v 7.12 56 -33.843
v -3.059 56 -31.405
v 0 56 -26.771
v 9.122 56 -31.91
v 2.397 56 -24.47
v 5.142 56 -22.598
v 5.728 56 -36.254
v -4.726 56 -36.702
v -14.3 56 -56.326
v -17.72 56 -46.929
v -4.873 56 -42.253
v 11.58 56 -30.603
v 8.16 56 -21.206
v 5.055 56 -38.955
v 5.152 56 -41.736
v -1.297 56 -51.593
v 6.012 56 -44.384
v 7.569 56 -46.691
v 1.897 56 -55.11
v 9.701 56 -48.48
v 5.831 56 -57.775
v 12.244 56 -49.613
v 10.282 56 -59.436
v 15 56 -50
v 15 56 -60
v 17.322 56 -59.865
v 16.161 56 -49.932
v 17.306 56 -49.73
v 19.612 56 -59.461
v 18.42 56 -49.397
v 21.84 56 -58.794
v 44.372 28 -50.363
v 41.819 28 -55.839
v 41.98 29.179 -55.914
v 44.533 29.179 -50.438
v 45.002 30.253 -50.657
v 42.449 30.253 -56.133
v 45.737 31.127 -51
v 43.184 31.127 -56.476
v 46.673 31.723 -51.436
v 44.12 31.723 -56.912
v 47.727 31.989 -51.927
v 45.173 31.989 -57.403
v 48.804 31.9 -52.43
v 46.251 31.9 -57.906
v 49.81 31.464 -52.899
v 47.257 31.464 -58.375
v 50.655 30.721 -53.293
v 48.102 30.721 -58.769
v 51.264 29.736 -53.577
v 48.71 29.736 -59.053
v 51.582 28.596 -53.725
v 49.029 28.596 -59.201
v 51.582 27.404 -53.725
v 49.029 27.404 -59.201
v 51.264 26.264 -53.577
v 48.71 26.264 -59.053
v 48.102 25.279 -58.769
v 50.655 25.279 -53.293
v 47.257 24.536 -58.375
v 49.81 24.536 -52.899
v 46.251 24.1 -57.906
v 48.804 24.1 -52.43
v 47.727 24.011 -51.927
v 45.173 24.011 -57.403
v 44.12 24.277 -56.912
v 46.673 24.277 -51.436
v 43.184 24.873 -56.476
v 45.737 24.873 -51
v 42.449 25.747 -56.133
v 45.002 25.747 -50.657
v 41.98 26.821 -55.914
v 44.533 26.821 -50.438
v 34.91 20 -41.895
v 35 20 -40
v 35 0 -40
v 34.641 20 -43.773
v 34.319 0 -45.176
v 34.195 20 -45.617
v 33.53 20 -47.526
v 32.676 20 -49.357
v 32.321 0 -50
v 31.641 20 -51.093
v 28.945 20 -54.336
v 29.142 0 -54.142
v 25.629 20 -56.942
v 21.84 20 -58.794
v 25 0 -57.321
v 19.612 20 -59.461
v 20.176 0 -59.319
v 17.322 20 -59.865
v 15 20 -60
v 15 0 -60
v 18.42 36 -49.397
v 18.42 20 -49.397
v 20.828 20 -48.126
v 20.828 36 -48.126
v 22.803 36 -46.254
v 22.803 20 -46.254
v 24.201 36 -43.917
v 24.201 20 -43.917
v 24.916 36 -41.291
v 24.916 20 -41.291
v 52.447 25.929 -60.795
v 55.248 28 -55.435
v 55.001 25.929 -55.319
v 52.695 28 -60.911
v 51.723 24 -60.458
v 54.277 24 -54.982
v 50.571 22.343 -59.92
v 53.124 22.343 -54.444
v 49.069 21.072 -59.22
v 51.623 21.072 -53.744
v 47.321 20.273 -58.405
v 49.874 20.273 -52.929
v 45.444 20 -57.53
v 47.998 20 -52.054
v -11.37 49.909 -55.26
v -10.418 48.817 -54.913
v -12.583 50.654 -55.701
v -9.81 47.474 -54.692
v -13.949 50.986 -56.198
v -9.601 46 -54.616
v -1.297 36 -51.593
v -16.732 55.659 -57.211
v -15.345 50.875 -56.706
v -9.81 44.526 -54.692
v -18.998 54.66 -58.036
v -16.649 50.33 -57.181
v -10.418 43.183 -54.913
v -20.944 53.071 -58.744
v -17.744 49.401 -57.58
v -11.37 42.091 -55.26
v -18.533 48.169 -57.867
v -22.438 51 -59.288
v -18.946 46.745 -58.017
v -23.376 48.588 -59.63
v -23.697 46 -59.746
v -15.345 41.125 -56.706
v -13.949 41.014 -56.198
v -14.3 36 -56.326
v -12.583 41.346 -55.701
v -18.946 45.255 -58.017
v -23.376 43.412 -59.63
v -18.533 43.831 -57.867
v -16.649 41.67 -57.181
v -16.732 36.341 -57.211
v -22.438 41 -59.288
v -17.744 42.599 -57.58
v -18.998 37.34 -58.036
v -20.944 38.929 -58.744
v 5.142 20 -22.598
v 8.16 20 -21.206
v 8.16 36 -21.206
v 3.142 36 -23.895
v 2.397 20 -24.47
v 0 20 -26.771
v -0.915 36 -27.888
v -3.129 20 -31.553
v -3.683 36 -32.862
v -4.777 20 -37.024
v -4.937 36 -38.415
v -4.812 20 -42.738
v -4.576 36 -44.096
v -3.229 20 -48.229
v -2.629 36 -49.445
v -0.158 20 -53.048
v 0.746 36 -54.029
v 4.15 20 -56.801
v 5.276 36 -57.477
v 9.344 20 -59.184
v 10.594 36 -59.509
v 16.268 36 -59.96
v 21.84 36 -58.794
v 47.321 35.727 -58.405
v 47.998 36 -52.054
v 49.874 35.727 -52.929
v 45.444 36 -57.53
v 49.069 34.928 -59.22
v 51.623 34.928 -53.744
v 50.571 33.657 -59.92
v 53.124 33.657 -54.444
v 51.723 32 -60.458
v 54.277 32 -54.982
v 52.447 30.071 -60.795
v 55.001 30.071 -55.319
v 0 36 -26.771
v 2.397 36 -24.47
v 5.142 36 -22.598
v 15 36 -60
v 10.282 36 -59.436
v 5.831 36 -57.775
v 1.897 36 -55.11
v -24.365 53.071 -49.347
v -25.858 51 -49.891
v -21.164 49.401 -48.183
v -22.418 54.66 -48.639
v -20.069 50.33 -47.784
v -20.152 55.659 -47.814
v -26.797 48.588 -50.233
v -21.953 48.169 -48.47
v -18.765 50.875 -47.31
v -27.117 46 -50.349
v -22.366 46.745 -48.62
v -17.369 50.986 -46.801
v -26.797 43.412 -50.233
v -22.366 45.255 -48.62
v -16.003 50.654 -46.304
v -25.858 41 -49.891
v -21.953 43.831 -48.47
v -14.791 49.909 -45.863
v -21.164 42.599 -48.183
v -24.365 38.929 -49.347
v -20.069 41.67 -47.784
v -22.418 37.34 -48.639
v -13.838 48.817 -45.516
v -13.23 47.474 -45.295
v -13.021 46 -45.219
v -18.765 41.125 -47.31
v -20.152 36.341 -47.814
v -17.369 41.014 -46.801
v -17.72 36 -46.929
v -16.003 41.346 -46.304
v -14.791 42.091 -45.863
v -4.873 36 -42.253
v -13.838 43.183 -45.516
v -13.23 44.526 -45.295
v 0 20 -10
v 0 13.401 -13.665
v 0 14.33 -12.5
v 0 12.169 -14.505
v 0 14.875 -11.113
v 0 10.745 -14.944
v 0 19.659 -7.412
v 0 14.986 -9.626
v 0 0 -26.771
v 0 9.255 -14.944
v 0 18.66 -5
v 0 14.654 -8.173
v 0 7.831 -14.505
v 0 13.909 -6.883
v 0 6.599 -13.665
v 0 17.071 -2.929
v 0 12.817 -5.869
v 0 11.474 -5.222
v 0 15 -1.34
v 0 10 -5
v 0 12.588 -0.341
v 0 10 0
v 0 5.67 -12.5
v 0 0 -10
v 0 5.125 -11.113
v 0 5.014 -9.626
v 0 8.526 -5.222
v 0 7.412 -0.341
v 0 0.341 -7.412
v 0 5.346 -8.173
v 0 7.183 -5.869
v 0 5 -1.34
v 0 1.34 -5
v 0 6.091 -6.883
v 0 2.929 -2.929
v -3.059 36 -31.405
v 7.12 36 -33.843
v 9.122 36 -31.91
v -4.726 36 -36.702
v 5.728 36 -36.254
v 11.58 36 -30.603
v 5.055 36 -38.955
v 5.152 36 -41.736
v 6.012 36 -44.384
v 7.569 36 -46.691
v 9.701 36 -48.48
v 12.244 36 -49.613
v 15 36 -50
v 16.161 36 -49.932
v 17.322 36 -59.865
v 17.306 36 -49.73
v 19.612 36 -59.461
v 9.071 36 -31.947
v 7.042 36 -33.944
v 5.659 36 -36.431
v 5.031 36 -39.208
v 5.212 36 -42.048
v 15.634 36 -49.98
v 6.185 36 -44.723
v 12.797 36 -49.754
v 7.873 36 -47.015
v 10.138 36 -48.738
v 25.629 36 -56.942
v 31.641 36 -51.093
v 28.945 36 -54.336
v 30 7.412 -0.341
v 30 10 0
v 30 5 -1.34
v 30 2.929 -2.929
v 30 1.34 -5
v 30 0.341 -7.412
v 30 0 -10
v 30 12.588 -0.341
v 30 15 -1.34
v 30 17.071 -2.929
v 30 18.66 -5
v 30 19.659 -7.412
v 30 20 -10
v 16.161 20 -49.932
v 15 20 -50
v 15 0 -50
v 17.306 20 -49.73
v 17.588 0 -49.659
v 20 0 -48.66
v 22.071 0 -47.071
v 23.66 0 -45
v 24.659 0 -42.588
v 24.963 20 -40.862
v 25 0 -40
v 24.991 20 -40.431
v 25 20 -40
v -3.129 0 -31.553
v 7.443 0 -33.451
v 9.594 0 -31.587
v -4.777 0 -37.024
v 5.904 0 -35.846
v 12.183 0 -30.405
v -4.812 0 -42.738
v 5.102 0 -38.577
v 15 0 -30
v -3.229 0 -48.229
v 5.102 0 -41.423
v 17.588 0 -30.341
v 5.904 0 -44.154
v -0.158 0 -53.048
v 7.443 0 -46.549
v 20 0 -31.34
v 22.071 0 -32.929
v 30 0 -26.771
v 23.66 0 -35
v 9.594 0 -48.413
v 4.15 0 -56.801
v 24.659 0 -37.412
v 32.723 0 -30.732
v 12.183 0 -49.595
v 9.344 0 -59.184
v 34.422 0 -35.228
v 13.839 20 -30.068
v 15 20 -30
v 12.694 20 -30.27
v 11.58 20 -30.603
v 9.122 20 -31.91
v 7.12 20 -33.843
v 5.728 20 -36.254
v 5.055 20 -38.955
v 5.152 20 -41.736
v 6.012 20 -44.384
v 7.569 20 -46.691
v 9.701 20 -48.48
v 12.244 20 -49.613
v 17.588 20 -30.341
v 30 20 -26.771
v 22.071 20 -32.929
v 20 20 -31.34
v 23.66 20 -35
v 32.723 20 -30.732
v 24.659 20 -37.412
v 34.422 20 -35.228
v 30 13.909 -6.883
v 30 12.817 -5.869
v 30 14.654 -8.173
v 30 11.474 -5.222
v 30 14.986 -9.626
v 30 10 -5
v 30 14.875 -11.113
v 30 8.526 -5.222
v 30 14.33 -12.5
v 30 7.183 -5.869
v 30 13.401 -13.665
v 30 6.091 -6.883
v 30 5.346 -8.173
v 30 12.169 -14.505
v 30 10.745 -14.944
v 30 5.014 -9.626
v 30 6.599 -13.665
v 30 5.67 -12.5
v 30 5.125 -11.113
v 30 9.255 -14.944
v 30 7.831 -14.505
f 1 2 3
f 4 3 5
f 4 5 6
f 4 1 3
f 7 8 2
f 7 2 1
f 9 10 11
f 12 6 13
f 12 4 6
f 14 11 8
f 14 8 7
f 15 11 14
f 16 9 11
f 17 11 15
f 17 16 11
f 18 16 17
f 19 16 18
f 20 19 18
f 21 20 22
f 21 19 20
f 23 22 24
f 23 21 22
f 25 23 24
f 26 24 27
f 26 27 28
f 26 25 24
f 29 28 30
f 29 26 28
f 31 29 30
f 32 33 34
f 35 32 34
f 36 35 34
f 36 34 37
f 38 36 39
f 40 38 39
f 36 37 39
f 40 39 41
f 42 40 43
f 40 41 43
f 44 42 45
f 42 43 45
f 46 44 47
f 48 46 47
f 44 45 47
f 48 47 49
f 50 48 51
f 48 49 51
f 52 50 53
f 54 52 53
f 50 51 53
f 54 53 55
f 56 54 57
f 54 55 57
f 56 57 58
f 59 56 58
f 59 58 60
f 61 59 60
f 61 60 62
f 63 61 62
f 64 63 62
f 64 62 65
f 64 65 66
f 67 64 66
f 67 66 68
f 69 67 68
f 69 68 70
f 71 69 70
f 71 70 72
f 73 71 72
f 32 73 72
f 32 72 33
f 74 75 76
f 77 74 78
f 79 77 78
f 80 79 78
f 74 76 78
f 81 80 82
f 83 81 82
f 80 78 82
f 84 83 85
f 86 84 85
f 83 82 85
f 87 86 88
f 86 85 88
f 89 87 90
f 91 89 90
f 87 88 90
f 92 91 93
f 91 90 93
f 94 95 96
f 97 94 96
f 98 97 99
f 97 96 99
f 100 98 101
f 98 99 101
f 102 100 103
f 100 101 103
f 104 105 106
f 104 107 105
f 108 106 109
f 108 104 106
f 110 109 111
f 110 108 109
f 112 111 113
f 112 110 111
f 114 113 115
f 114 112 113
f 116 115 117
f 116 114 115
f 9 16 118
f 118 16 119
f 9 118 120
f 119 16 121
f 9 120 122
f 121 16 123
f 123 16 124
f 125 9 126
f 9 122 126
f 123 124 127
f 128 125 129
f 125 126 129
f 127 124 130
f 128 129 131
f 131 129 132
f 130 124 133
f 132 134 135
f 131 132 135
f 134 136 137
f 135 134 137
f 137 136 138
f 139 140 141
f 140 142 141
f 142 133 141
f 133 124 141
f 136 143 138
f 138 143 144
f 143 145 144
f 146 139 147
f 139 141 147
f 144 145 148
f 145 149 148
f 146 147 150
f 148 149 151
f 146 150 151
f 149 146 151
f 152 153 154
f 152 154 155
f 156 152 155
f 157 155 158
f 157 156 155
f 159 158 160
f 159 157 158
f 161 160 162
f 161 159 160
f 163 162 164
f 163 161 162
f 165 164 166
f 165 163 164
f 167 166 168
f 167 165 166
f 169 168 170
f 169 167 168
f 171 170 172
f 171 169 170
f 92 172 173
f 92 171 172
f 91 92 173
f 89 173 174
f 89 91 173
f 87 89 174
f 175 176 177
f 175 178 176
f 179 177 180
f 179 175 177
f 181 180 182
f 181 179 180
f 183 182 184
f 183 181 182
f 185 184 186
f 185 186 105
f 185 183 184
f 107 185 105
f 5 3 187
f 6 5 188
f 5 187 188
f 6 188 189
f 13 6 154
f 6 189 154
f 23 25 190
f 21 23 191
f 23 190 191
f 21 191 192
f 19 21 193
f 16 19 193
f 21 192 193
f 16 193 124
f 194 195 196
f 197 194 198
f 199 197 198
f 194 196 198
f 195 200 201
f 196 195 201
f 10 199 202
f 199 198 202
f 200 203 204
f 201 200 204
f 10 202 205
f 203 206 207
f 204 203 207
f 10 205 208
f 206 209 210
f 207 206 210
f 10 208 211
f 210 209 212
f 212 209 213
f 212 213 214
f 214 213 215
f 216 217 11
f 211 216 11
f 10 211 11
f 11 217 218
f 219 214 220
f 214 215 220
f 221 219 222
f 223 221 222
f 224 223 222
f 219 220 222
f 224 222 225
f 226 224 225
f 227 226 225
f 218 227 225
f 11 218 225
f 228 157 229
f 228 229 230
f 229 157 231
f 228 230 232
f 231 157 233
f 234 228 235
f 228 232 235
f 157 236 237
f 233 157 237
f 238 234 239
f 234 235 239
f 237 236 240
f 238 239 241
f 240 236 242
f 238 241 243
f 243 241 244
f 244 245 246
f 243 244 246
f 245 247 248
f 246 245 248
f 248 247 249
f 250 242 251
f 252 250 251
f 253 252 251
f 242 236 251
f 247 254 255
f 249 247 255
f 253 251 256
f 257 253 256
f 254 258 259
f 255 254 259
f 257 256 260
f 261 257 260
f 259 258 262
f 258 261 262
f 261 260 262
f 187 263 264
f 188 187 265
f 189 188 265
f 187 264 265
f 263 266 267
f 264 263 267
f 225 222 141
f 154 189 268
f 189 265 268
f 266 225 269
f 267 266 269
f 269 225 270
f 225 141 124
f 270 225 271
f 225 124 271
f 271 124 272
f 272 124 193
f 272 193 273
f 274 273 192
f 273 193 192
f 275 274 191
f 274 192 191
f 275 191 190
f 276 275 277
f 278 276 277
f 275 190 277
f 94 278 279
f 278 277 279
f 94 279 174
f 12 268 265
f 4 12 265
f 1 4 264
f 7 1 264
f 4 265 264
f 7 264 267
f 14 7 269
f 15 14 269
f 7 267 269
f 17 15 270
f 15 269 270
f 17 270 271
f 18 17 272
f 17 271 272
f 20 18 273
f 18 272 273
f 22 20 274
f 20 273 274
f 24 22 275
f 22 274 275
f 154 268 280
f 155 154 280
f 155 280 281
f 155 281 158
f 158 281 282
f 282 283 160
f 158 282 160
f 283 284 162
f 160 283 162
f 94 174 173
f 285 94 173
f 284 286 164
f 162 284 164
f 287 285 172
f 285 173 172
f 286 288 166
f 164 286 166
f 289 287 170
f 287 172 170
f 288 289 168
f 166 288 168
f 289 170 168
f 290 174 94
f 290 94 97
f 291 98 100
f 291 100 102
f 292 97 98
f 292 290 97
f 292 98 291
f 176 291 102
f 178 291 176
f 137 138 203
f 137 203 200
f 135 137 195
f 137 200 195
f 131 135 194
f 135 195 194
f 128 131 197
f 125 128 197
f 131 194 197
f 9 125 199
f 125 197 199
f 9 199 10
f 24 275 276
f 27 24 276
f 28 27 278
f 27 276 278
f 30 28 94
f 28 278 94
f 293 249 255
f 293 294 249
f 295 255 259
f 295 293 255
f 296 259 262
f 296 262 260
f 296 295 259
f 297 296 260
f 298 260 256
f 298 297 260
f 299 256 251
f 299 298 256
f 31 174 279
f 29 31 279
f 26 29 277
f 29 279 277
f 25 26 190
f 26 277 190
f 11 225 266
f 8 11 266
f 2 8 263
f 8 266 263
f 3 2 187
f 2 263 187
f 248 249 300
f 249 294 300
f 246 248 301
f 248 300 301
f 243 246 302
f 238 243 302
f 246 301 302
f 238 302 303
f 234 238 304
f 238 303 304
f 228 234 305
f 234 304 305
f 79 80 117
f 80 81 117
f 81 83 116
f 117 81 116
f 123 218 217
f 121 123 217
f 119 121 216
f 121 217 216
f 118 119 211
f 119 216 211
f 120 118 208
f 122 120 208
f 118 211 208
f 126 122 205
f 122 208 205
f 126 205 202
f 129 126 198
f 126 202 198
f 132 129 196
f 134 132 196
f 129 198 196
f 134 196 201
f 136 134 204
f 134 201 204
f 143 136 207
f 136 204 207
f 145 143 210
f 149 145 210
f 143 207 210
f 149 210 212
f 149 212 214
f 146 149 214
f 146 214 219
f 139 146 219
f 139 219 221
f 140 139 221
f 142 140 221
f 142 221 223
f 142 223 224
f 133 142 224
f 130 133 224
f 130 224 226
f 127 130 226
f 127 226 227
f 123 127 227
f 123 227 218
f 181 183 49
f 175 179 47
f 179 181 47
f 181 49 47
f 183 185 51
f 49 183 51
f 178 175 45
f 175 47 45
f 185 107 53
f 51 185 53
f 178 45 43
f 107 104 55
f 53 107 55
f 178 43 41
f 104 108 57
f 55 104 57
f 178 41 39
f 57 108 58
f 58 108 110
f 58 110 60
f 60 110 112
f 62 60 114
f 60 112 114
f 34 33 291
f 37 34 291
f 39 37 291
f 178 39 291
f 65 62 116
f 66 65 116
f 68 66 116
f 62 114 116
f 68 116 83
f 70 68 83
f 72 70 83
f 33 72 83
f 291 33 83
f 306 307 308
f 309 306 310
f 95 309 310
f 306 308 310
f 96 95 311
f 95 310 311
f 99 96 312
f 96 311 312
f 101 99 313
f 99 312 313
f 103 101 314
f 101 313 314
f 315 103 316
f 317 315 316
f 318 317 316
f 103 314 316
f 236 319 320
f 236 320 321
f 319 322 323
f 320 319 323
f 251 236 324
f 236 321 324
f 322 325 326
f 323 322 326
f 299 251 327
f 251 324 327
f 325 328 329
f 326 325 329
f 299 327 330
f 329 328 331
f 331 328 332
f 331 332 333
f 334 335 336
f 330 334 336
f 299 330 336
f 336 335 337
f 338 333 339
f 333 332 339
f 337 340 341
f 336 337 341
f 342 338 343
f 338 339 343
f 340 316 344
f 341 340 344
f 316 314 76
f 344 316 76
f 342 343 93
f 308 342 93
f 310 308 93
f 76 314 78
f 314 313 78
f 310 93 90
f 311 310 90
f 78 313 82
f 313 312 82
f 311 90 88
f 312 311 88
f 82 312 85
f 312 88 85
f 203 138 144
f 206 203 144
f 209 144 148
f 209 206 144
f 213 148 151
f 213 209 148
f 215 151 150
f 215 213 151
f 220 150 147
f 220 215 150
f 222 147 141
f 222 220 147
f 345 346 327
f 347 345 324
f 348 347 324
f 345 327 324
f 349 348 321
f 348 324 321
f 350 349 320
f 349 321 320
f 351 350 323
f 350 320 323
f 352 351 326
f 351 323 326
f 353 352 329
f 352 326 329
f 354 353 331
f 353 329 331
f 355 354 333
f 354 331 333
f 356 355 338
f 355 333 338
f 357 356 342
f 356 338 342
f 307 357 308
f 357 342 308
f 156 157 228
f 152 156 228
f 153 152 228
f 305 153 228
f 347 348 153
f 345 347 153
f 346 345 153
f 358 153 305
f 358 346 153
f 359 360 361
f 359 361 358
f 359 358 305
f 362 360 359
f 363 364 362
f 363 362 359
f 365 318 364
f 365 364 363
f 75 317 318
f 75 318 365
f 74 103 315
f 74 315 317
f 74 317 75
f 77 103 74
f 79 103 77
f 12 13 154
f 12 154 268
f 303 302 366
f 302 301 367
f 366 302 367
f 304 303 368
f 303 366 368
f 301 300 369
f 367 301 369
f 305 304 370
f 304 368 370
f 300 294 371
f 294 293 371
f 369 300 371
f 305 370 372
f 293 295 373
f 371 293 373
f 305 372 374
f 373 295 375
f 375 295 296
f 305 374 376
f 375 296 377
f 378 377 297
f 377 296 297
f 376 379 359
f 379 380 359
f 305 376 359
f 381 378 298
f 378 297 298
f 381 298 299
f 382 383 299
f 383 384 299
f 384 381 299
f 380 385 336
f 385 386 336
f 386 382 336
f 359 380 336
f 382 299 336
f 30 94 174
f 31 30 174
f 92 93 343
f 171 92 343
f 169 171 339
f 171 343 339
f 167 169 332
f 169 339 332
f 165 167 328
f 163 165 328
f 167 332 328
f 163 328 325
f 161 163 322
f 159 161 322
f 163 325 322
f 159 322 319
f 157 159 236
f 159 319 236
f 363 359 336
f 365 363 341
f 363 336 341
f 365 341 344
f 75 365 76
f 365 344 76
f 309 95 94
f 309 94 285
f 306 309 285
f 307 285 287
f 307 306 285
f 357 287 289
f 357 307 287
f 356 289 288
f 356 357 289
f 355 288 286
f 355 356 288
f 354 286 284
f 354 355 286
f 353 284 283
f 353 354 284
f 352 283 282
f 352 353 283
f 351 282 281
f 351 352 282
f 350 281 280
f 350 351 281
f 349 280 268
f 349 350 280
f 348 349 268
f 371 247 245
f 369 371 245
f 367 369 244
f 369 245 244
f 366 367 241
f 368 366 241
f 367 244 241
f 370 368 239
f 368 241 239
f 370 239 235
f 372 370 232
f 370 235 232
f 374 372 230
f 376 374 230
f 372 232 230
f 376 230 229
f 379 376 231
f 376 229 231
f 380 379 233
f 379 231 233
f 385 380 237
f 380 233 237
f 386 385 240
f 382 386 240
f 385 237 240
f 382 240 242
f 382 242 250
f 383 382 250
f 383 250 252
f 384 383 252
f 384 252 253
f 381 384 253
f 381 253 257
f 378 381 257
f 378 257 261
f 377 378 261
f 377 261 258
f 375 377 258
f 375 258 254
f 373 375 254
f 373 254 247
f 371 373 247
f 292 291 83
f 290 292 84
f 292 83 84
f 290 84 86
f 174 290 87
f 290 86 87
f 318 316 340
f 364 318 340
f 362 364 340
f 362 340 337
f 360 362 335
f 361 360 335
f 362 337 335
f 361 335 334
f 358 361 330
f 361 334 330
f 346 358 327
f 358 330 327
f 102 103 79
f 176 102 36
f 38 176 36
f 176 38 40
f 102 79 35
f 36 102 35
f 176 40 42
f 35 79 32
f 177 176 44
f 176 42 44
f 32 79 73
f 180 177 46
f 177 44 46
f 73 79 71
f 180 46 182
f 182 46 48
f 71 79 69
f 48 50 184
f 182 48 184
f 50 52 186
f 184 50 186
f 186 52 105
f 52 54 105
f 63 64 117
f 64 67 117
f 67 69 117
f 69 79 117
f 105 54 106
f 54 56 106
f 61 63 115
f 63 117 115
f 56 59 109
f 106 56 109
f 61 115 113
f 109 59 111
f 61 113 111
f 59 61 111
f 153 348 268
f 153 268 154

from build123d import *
from build123d.topology import SkipClean

# Parameters (mm, degrees)
EXTRUDE_4_DEPTH     = 20
FILLET_2_R          = 10
SKETCH_5_R          = 5
CUT_EXTRUDE_1_DEPTH = 73.284161474
EXTRUDE_START       = 16
EXTRUDE_6_DEPTH     = 20
FILLET_3_R          = 10
SKETCH_9_R          = 5
CUT_EXTRUDE_2_DEPTH = 78.613189577
EXTRUDE_7_DEPTH     = 16
FILLET_4_R          = 8
SKETCH_13_R         = 4
CUT_EXTRUDE_3_DEPTH = 95.259541887
EXTRUDE_8_DEPTH     = 16


with BuildPart() as part:
    # 草图1 → 凸台-拉伸4 (new body)
    with BuildSketch(Plane(origin=(0, 0, 0), x_dir=(1, 0, 0), z_dir=(0, 1, 0))):
        with BuildLine():
            ThreePointArc((15, 60), (-3.228756555, 48.228756555), (0, 26.771243445))
            ThreePointArc((0, 26.771243445), (6.771243445, 21.771243445), (15, 20))
            Line((15, 20), (15, 30))
            ThreePointArc((15, 30), (5, 40), (15, 50))
            Line((15, 50), (15, 60))
        make_face()
        with BuildLine():
            ThreePointArc((35, 40), (29.142135624, 54.142135624), (15, 60))
            Line((15, 60), (15, 50))
            ThreePointArc((15, 50), (22.071067812, 47.071067812), (25, 40))
            ThreePointArc((25, 40), (22.071067812, 32.928932188), (15, 30))
            Line((15, 30), (15, 20))
            ThreePointArc((15, 20), (23.228756555, 21.771243445), (30, 26.771243445))
            ThreePointArc((30, 26.771243445), (33.708286934, 32.928932188), (35, 40))
        make_face()
        with BuildLine():
            ThreePointArc((15, 60), (-3.228756555, 48.228756555), (0, 26.771243445))
            ThreePointArc((0, 26.771243445), (6.771243445, 21.771243445), (15, 20))
            Line((15, 20), (15, 30))
            ThreePointArc((15, 30), (5, 40), (15, 50))
            Line((15, 50), (15, 60))
        make_face()
        with BuildLine():
            ThreePointArc((35, 40), (29.142135624, 54.142135624), (15, 60))
            Line((15, 60), (15, 50))
            ThreePointArc((15, 50), (22.071067812, 47.071067812), (25, 40))
            ThreePointArc((25, 40), (22.071067812, 32.928932188), (15, 30))
            Line((15, 30), (15, 20))
            ThreePointArc((15, 20), (23.228756555, 21.771243445), (30, 26.771243445))
            ThreePointArc((30, 26.771243445), (33.708286934, 32.928932188), (35, 40))
        make_face()
        with BuildLine():
            Line((0, 26.771243445), (0, 0))
            Line((0, 0), (15, 0))
            Line((15, 0), (15, 20))
            ThreePointArc((15, 20), (6.771243445, 21.771243445), (0, 26.771243445))
        make_face()
        with BuildLine():
            Line((15, 20), (15, 0))
            Line((15, 0), (30, 0))
            Line((30, 0), (30, 26.771243445))
            ThreePointArc((30, 26.771243445), (23.228756555, 21.771243445), (15, 20))
        make_face()
    extrude(amount=EXTRUDE_4_DEPTH)

    # 圆角2
    fillet_2_edges = [part.edges().sort_by_distance(p)[0] for p in [
        (15, 0, 0),
        (15, 20, 0),
    ]]
    fillet(fillet_2_edges, radius=FILLET_2_R - 0.0001)  # a hair under: the kernel refuses the full size

    # 草图5 → 切除-拉伸1 (cut, through all)
    with BuildSketch(Plane.ZY):
        with Locations((-10, 10)):
            Circle(SKETCH_5_R)
    extrude(amount=-CUT_EXTRUDE_1_DEPTH, mode=Mode.SUBTRACT)

    # 草图11 → 凸台-拉伸7 (add)
    with BuildSketch(Plane(origin=(0, 20, 0), x_dir=(1, 0, 0), z_dir=(0, 1, 0))):
        with BuildLine():
            Line((21.840402867, 58.793852416), (18.420201433, 49.396926208))
            ThreePointArc((18.420201433, 49.396926208), (22.803417949, 46.253532466), (24.916346187, 41.290766554))
            Line((24.916346187, 41.290766554), (55.247963432, 55.434631959))
            Line((55.247963432, 55.434631959), (52.694506253, 60.910538551))
            Line((52.694506253, 60.910538551), (31.641450271, 51.093337319))
            ThreePointArc((31.641450271, 51.093337319), (27.356125602, 55.726606758), (21.840402867, 58.793852416))
        make_face()
    extrude(amount=EXTRUDE_7_DEPTH)

    # 圆角4
    fillet_4_edges = [part.edges().sort_by_distance(p)[0] for p in [
        (53.971234843, 20, -58.172585255),
        (53.971234843, 36, -58.172585255),
    ]]
    fillet(fillet_4_edges, radius=FILLET_4_R - 0.0001)  # a hair under: the kernel refuses the full size

    # 草图13 → 切除-拉伸3 (cut, through all)
    with BuildSketch(Plane(origin=(-13.918524524, 0, -29.848372166), x_dir=(-0.9063077870366495, 0, 0.42261826174070066), z_dir=(-0.42261826174070066, 0, -0.9063077870366495))):
        with Locations((-65.499347275, 28)):
            Circle(SKETCH_13_R)
    extrude(amount=-CUT_EXTRUDE_3_DEPTH, mode=Mode.SUBTRACT)

    # 草图15 → 凸台-拉伸8 (add)
    with SkipClean():  # the faces are left unmerged after this step: merging them gives an invalid solid
        with BuildSketch(Plane(origin=(0, 20, 0), x_dir=(1, 0, 0), z_dir=(0, 1, 0))):
            with BuildLine():
                Line((11.579798567, 30.603073792), (8.159597133, 21.206147584))
                ThreePointArc((8.159597133, 21.206147584), (-3.793852416, 46.840402867), (21.840402867, 58.793852416))
                Line((21.840402867, 58.793852416), (18.420201433, 49.396926208))
                ThreePointArc((18.420201433, 49.396926208), (5.603073792, 43.420201433), (11.579798567, 30.603073792))
            make_face()
        extrude(amount=EXTRUDE_8_DEPTH)


with BuildPart() as body_2:
    # 草图7 → 凸台-拉伸6 (new body)
    with BuildSketch(Plane(origin=(0, 20, 0), x_dir=(1, 0, 0), z_dir=(0, 1, 0)).offset(EXTRUDE_START)):
        with BuildLine():
            Line((18.420201433, 49.396926208), (21.840402867, 58.793852416))
            ThreePointArc((21.840402867, 58.793852416), (18.472963553, 59.69615506), (15, 60))
            Line((15, 60), (15, 50))
            ThreePointArc((15, 50), (16.736481777, 49.84807753), (18.420201433, 49.396926208))
        make_face()
        with BuildLine():
            Line((15, 50), (15, 60))
            ThreePointArc((15, 60), (5.831214309, 57.774514591), (-1.297071505, 51.593336895))
            ThreePointArc((-1.297071505, 51.593336895), (-3.678158381, 47.150272687), (-4.872696835, 42.25298036))
            ThreePointArc((-4.872696835, 42.25298036), (-4.077402617, 33.995609158), (0, 26.771243445))
            ThreePointArc((0, 26.771243445), (3.73086639, 23.477087797), (8.159597133, 21.206147584))
            Line((8.159597133, 21.206147584), (11.579798567, 30.603073792))
            ThreePointArc((11.579798567, 30.603073792), (5.15192247, 41.736481777), (15, 50))
        make_face()
        with BuildLine():
            ThreePointArc((-4.872696835, 42.25298036), (-3.678158381, 47.150272687), (-1.297071505, 51.593336895))
            Line((-1.297071505, 51.593336895), (-23.696681977, 59.746128366))
            Line((-23.696681977, 59.746128366), (-27.11688341, 50.349202158))
            Line((-27.11688341, 50.349202158), (-4.872696835, 42.25298036))
        make_face()
    extrude(amount=EXTRUDE_6_DEPTH)

    # 圆角3
    fillet_3_edges = [body_2.edges().sort_by_distance(p)[0] for p in [
        (-25.406782694, 36, -55.047665262),
        (-25.406782694, 56, -55.047665262),
    ]]
    fillet(fillet_3_edges, radius=FILLET_3_R - 0.0001)  # a hair under: the kernel refuses the full size

    # 草图9 → 切除-拉伸2 (cut, through all)
    with BuildSketch(Plane(origin=(13.009848873, 0, -35.744266009), x_dir=(0.9396926207859082, 0, 0.34202014332566943), z_dir=(-0.34202014332566943, 0, 0.9396926207859082))):
        with Locations((-32.701976578, 46)):
            Circle(SKETCH_9_R)
    extrude(amount=-CUT_EXTRUDE_2_DEPTH, mode=Mode.SUBTRACT)


solid = Compound([part.part, body_2.part])
